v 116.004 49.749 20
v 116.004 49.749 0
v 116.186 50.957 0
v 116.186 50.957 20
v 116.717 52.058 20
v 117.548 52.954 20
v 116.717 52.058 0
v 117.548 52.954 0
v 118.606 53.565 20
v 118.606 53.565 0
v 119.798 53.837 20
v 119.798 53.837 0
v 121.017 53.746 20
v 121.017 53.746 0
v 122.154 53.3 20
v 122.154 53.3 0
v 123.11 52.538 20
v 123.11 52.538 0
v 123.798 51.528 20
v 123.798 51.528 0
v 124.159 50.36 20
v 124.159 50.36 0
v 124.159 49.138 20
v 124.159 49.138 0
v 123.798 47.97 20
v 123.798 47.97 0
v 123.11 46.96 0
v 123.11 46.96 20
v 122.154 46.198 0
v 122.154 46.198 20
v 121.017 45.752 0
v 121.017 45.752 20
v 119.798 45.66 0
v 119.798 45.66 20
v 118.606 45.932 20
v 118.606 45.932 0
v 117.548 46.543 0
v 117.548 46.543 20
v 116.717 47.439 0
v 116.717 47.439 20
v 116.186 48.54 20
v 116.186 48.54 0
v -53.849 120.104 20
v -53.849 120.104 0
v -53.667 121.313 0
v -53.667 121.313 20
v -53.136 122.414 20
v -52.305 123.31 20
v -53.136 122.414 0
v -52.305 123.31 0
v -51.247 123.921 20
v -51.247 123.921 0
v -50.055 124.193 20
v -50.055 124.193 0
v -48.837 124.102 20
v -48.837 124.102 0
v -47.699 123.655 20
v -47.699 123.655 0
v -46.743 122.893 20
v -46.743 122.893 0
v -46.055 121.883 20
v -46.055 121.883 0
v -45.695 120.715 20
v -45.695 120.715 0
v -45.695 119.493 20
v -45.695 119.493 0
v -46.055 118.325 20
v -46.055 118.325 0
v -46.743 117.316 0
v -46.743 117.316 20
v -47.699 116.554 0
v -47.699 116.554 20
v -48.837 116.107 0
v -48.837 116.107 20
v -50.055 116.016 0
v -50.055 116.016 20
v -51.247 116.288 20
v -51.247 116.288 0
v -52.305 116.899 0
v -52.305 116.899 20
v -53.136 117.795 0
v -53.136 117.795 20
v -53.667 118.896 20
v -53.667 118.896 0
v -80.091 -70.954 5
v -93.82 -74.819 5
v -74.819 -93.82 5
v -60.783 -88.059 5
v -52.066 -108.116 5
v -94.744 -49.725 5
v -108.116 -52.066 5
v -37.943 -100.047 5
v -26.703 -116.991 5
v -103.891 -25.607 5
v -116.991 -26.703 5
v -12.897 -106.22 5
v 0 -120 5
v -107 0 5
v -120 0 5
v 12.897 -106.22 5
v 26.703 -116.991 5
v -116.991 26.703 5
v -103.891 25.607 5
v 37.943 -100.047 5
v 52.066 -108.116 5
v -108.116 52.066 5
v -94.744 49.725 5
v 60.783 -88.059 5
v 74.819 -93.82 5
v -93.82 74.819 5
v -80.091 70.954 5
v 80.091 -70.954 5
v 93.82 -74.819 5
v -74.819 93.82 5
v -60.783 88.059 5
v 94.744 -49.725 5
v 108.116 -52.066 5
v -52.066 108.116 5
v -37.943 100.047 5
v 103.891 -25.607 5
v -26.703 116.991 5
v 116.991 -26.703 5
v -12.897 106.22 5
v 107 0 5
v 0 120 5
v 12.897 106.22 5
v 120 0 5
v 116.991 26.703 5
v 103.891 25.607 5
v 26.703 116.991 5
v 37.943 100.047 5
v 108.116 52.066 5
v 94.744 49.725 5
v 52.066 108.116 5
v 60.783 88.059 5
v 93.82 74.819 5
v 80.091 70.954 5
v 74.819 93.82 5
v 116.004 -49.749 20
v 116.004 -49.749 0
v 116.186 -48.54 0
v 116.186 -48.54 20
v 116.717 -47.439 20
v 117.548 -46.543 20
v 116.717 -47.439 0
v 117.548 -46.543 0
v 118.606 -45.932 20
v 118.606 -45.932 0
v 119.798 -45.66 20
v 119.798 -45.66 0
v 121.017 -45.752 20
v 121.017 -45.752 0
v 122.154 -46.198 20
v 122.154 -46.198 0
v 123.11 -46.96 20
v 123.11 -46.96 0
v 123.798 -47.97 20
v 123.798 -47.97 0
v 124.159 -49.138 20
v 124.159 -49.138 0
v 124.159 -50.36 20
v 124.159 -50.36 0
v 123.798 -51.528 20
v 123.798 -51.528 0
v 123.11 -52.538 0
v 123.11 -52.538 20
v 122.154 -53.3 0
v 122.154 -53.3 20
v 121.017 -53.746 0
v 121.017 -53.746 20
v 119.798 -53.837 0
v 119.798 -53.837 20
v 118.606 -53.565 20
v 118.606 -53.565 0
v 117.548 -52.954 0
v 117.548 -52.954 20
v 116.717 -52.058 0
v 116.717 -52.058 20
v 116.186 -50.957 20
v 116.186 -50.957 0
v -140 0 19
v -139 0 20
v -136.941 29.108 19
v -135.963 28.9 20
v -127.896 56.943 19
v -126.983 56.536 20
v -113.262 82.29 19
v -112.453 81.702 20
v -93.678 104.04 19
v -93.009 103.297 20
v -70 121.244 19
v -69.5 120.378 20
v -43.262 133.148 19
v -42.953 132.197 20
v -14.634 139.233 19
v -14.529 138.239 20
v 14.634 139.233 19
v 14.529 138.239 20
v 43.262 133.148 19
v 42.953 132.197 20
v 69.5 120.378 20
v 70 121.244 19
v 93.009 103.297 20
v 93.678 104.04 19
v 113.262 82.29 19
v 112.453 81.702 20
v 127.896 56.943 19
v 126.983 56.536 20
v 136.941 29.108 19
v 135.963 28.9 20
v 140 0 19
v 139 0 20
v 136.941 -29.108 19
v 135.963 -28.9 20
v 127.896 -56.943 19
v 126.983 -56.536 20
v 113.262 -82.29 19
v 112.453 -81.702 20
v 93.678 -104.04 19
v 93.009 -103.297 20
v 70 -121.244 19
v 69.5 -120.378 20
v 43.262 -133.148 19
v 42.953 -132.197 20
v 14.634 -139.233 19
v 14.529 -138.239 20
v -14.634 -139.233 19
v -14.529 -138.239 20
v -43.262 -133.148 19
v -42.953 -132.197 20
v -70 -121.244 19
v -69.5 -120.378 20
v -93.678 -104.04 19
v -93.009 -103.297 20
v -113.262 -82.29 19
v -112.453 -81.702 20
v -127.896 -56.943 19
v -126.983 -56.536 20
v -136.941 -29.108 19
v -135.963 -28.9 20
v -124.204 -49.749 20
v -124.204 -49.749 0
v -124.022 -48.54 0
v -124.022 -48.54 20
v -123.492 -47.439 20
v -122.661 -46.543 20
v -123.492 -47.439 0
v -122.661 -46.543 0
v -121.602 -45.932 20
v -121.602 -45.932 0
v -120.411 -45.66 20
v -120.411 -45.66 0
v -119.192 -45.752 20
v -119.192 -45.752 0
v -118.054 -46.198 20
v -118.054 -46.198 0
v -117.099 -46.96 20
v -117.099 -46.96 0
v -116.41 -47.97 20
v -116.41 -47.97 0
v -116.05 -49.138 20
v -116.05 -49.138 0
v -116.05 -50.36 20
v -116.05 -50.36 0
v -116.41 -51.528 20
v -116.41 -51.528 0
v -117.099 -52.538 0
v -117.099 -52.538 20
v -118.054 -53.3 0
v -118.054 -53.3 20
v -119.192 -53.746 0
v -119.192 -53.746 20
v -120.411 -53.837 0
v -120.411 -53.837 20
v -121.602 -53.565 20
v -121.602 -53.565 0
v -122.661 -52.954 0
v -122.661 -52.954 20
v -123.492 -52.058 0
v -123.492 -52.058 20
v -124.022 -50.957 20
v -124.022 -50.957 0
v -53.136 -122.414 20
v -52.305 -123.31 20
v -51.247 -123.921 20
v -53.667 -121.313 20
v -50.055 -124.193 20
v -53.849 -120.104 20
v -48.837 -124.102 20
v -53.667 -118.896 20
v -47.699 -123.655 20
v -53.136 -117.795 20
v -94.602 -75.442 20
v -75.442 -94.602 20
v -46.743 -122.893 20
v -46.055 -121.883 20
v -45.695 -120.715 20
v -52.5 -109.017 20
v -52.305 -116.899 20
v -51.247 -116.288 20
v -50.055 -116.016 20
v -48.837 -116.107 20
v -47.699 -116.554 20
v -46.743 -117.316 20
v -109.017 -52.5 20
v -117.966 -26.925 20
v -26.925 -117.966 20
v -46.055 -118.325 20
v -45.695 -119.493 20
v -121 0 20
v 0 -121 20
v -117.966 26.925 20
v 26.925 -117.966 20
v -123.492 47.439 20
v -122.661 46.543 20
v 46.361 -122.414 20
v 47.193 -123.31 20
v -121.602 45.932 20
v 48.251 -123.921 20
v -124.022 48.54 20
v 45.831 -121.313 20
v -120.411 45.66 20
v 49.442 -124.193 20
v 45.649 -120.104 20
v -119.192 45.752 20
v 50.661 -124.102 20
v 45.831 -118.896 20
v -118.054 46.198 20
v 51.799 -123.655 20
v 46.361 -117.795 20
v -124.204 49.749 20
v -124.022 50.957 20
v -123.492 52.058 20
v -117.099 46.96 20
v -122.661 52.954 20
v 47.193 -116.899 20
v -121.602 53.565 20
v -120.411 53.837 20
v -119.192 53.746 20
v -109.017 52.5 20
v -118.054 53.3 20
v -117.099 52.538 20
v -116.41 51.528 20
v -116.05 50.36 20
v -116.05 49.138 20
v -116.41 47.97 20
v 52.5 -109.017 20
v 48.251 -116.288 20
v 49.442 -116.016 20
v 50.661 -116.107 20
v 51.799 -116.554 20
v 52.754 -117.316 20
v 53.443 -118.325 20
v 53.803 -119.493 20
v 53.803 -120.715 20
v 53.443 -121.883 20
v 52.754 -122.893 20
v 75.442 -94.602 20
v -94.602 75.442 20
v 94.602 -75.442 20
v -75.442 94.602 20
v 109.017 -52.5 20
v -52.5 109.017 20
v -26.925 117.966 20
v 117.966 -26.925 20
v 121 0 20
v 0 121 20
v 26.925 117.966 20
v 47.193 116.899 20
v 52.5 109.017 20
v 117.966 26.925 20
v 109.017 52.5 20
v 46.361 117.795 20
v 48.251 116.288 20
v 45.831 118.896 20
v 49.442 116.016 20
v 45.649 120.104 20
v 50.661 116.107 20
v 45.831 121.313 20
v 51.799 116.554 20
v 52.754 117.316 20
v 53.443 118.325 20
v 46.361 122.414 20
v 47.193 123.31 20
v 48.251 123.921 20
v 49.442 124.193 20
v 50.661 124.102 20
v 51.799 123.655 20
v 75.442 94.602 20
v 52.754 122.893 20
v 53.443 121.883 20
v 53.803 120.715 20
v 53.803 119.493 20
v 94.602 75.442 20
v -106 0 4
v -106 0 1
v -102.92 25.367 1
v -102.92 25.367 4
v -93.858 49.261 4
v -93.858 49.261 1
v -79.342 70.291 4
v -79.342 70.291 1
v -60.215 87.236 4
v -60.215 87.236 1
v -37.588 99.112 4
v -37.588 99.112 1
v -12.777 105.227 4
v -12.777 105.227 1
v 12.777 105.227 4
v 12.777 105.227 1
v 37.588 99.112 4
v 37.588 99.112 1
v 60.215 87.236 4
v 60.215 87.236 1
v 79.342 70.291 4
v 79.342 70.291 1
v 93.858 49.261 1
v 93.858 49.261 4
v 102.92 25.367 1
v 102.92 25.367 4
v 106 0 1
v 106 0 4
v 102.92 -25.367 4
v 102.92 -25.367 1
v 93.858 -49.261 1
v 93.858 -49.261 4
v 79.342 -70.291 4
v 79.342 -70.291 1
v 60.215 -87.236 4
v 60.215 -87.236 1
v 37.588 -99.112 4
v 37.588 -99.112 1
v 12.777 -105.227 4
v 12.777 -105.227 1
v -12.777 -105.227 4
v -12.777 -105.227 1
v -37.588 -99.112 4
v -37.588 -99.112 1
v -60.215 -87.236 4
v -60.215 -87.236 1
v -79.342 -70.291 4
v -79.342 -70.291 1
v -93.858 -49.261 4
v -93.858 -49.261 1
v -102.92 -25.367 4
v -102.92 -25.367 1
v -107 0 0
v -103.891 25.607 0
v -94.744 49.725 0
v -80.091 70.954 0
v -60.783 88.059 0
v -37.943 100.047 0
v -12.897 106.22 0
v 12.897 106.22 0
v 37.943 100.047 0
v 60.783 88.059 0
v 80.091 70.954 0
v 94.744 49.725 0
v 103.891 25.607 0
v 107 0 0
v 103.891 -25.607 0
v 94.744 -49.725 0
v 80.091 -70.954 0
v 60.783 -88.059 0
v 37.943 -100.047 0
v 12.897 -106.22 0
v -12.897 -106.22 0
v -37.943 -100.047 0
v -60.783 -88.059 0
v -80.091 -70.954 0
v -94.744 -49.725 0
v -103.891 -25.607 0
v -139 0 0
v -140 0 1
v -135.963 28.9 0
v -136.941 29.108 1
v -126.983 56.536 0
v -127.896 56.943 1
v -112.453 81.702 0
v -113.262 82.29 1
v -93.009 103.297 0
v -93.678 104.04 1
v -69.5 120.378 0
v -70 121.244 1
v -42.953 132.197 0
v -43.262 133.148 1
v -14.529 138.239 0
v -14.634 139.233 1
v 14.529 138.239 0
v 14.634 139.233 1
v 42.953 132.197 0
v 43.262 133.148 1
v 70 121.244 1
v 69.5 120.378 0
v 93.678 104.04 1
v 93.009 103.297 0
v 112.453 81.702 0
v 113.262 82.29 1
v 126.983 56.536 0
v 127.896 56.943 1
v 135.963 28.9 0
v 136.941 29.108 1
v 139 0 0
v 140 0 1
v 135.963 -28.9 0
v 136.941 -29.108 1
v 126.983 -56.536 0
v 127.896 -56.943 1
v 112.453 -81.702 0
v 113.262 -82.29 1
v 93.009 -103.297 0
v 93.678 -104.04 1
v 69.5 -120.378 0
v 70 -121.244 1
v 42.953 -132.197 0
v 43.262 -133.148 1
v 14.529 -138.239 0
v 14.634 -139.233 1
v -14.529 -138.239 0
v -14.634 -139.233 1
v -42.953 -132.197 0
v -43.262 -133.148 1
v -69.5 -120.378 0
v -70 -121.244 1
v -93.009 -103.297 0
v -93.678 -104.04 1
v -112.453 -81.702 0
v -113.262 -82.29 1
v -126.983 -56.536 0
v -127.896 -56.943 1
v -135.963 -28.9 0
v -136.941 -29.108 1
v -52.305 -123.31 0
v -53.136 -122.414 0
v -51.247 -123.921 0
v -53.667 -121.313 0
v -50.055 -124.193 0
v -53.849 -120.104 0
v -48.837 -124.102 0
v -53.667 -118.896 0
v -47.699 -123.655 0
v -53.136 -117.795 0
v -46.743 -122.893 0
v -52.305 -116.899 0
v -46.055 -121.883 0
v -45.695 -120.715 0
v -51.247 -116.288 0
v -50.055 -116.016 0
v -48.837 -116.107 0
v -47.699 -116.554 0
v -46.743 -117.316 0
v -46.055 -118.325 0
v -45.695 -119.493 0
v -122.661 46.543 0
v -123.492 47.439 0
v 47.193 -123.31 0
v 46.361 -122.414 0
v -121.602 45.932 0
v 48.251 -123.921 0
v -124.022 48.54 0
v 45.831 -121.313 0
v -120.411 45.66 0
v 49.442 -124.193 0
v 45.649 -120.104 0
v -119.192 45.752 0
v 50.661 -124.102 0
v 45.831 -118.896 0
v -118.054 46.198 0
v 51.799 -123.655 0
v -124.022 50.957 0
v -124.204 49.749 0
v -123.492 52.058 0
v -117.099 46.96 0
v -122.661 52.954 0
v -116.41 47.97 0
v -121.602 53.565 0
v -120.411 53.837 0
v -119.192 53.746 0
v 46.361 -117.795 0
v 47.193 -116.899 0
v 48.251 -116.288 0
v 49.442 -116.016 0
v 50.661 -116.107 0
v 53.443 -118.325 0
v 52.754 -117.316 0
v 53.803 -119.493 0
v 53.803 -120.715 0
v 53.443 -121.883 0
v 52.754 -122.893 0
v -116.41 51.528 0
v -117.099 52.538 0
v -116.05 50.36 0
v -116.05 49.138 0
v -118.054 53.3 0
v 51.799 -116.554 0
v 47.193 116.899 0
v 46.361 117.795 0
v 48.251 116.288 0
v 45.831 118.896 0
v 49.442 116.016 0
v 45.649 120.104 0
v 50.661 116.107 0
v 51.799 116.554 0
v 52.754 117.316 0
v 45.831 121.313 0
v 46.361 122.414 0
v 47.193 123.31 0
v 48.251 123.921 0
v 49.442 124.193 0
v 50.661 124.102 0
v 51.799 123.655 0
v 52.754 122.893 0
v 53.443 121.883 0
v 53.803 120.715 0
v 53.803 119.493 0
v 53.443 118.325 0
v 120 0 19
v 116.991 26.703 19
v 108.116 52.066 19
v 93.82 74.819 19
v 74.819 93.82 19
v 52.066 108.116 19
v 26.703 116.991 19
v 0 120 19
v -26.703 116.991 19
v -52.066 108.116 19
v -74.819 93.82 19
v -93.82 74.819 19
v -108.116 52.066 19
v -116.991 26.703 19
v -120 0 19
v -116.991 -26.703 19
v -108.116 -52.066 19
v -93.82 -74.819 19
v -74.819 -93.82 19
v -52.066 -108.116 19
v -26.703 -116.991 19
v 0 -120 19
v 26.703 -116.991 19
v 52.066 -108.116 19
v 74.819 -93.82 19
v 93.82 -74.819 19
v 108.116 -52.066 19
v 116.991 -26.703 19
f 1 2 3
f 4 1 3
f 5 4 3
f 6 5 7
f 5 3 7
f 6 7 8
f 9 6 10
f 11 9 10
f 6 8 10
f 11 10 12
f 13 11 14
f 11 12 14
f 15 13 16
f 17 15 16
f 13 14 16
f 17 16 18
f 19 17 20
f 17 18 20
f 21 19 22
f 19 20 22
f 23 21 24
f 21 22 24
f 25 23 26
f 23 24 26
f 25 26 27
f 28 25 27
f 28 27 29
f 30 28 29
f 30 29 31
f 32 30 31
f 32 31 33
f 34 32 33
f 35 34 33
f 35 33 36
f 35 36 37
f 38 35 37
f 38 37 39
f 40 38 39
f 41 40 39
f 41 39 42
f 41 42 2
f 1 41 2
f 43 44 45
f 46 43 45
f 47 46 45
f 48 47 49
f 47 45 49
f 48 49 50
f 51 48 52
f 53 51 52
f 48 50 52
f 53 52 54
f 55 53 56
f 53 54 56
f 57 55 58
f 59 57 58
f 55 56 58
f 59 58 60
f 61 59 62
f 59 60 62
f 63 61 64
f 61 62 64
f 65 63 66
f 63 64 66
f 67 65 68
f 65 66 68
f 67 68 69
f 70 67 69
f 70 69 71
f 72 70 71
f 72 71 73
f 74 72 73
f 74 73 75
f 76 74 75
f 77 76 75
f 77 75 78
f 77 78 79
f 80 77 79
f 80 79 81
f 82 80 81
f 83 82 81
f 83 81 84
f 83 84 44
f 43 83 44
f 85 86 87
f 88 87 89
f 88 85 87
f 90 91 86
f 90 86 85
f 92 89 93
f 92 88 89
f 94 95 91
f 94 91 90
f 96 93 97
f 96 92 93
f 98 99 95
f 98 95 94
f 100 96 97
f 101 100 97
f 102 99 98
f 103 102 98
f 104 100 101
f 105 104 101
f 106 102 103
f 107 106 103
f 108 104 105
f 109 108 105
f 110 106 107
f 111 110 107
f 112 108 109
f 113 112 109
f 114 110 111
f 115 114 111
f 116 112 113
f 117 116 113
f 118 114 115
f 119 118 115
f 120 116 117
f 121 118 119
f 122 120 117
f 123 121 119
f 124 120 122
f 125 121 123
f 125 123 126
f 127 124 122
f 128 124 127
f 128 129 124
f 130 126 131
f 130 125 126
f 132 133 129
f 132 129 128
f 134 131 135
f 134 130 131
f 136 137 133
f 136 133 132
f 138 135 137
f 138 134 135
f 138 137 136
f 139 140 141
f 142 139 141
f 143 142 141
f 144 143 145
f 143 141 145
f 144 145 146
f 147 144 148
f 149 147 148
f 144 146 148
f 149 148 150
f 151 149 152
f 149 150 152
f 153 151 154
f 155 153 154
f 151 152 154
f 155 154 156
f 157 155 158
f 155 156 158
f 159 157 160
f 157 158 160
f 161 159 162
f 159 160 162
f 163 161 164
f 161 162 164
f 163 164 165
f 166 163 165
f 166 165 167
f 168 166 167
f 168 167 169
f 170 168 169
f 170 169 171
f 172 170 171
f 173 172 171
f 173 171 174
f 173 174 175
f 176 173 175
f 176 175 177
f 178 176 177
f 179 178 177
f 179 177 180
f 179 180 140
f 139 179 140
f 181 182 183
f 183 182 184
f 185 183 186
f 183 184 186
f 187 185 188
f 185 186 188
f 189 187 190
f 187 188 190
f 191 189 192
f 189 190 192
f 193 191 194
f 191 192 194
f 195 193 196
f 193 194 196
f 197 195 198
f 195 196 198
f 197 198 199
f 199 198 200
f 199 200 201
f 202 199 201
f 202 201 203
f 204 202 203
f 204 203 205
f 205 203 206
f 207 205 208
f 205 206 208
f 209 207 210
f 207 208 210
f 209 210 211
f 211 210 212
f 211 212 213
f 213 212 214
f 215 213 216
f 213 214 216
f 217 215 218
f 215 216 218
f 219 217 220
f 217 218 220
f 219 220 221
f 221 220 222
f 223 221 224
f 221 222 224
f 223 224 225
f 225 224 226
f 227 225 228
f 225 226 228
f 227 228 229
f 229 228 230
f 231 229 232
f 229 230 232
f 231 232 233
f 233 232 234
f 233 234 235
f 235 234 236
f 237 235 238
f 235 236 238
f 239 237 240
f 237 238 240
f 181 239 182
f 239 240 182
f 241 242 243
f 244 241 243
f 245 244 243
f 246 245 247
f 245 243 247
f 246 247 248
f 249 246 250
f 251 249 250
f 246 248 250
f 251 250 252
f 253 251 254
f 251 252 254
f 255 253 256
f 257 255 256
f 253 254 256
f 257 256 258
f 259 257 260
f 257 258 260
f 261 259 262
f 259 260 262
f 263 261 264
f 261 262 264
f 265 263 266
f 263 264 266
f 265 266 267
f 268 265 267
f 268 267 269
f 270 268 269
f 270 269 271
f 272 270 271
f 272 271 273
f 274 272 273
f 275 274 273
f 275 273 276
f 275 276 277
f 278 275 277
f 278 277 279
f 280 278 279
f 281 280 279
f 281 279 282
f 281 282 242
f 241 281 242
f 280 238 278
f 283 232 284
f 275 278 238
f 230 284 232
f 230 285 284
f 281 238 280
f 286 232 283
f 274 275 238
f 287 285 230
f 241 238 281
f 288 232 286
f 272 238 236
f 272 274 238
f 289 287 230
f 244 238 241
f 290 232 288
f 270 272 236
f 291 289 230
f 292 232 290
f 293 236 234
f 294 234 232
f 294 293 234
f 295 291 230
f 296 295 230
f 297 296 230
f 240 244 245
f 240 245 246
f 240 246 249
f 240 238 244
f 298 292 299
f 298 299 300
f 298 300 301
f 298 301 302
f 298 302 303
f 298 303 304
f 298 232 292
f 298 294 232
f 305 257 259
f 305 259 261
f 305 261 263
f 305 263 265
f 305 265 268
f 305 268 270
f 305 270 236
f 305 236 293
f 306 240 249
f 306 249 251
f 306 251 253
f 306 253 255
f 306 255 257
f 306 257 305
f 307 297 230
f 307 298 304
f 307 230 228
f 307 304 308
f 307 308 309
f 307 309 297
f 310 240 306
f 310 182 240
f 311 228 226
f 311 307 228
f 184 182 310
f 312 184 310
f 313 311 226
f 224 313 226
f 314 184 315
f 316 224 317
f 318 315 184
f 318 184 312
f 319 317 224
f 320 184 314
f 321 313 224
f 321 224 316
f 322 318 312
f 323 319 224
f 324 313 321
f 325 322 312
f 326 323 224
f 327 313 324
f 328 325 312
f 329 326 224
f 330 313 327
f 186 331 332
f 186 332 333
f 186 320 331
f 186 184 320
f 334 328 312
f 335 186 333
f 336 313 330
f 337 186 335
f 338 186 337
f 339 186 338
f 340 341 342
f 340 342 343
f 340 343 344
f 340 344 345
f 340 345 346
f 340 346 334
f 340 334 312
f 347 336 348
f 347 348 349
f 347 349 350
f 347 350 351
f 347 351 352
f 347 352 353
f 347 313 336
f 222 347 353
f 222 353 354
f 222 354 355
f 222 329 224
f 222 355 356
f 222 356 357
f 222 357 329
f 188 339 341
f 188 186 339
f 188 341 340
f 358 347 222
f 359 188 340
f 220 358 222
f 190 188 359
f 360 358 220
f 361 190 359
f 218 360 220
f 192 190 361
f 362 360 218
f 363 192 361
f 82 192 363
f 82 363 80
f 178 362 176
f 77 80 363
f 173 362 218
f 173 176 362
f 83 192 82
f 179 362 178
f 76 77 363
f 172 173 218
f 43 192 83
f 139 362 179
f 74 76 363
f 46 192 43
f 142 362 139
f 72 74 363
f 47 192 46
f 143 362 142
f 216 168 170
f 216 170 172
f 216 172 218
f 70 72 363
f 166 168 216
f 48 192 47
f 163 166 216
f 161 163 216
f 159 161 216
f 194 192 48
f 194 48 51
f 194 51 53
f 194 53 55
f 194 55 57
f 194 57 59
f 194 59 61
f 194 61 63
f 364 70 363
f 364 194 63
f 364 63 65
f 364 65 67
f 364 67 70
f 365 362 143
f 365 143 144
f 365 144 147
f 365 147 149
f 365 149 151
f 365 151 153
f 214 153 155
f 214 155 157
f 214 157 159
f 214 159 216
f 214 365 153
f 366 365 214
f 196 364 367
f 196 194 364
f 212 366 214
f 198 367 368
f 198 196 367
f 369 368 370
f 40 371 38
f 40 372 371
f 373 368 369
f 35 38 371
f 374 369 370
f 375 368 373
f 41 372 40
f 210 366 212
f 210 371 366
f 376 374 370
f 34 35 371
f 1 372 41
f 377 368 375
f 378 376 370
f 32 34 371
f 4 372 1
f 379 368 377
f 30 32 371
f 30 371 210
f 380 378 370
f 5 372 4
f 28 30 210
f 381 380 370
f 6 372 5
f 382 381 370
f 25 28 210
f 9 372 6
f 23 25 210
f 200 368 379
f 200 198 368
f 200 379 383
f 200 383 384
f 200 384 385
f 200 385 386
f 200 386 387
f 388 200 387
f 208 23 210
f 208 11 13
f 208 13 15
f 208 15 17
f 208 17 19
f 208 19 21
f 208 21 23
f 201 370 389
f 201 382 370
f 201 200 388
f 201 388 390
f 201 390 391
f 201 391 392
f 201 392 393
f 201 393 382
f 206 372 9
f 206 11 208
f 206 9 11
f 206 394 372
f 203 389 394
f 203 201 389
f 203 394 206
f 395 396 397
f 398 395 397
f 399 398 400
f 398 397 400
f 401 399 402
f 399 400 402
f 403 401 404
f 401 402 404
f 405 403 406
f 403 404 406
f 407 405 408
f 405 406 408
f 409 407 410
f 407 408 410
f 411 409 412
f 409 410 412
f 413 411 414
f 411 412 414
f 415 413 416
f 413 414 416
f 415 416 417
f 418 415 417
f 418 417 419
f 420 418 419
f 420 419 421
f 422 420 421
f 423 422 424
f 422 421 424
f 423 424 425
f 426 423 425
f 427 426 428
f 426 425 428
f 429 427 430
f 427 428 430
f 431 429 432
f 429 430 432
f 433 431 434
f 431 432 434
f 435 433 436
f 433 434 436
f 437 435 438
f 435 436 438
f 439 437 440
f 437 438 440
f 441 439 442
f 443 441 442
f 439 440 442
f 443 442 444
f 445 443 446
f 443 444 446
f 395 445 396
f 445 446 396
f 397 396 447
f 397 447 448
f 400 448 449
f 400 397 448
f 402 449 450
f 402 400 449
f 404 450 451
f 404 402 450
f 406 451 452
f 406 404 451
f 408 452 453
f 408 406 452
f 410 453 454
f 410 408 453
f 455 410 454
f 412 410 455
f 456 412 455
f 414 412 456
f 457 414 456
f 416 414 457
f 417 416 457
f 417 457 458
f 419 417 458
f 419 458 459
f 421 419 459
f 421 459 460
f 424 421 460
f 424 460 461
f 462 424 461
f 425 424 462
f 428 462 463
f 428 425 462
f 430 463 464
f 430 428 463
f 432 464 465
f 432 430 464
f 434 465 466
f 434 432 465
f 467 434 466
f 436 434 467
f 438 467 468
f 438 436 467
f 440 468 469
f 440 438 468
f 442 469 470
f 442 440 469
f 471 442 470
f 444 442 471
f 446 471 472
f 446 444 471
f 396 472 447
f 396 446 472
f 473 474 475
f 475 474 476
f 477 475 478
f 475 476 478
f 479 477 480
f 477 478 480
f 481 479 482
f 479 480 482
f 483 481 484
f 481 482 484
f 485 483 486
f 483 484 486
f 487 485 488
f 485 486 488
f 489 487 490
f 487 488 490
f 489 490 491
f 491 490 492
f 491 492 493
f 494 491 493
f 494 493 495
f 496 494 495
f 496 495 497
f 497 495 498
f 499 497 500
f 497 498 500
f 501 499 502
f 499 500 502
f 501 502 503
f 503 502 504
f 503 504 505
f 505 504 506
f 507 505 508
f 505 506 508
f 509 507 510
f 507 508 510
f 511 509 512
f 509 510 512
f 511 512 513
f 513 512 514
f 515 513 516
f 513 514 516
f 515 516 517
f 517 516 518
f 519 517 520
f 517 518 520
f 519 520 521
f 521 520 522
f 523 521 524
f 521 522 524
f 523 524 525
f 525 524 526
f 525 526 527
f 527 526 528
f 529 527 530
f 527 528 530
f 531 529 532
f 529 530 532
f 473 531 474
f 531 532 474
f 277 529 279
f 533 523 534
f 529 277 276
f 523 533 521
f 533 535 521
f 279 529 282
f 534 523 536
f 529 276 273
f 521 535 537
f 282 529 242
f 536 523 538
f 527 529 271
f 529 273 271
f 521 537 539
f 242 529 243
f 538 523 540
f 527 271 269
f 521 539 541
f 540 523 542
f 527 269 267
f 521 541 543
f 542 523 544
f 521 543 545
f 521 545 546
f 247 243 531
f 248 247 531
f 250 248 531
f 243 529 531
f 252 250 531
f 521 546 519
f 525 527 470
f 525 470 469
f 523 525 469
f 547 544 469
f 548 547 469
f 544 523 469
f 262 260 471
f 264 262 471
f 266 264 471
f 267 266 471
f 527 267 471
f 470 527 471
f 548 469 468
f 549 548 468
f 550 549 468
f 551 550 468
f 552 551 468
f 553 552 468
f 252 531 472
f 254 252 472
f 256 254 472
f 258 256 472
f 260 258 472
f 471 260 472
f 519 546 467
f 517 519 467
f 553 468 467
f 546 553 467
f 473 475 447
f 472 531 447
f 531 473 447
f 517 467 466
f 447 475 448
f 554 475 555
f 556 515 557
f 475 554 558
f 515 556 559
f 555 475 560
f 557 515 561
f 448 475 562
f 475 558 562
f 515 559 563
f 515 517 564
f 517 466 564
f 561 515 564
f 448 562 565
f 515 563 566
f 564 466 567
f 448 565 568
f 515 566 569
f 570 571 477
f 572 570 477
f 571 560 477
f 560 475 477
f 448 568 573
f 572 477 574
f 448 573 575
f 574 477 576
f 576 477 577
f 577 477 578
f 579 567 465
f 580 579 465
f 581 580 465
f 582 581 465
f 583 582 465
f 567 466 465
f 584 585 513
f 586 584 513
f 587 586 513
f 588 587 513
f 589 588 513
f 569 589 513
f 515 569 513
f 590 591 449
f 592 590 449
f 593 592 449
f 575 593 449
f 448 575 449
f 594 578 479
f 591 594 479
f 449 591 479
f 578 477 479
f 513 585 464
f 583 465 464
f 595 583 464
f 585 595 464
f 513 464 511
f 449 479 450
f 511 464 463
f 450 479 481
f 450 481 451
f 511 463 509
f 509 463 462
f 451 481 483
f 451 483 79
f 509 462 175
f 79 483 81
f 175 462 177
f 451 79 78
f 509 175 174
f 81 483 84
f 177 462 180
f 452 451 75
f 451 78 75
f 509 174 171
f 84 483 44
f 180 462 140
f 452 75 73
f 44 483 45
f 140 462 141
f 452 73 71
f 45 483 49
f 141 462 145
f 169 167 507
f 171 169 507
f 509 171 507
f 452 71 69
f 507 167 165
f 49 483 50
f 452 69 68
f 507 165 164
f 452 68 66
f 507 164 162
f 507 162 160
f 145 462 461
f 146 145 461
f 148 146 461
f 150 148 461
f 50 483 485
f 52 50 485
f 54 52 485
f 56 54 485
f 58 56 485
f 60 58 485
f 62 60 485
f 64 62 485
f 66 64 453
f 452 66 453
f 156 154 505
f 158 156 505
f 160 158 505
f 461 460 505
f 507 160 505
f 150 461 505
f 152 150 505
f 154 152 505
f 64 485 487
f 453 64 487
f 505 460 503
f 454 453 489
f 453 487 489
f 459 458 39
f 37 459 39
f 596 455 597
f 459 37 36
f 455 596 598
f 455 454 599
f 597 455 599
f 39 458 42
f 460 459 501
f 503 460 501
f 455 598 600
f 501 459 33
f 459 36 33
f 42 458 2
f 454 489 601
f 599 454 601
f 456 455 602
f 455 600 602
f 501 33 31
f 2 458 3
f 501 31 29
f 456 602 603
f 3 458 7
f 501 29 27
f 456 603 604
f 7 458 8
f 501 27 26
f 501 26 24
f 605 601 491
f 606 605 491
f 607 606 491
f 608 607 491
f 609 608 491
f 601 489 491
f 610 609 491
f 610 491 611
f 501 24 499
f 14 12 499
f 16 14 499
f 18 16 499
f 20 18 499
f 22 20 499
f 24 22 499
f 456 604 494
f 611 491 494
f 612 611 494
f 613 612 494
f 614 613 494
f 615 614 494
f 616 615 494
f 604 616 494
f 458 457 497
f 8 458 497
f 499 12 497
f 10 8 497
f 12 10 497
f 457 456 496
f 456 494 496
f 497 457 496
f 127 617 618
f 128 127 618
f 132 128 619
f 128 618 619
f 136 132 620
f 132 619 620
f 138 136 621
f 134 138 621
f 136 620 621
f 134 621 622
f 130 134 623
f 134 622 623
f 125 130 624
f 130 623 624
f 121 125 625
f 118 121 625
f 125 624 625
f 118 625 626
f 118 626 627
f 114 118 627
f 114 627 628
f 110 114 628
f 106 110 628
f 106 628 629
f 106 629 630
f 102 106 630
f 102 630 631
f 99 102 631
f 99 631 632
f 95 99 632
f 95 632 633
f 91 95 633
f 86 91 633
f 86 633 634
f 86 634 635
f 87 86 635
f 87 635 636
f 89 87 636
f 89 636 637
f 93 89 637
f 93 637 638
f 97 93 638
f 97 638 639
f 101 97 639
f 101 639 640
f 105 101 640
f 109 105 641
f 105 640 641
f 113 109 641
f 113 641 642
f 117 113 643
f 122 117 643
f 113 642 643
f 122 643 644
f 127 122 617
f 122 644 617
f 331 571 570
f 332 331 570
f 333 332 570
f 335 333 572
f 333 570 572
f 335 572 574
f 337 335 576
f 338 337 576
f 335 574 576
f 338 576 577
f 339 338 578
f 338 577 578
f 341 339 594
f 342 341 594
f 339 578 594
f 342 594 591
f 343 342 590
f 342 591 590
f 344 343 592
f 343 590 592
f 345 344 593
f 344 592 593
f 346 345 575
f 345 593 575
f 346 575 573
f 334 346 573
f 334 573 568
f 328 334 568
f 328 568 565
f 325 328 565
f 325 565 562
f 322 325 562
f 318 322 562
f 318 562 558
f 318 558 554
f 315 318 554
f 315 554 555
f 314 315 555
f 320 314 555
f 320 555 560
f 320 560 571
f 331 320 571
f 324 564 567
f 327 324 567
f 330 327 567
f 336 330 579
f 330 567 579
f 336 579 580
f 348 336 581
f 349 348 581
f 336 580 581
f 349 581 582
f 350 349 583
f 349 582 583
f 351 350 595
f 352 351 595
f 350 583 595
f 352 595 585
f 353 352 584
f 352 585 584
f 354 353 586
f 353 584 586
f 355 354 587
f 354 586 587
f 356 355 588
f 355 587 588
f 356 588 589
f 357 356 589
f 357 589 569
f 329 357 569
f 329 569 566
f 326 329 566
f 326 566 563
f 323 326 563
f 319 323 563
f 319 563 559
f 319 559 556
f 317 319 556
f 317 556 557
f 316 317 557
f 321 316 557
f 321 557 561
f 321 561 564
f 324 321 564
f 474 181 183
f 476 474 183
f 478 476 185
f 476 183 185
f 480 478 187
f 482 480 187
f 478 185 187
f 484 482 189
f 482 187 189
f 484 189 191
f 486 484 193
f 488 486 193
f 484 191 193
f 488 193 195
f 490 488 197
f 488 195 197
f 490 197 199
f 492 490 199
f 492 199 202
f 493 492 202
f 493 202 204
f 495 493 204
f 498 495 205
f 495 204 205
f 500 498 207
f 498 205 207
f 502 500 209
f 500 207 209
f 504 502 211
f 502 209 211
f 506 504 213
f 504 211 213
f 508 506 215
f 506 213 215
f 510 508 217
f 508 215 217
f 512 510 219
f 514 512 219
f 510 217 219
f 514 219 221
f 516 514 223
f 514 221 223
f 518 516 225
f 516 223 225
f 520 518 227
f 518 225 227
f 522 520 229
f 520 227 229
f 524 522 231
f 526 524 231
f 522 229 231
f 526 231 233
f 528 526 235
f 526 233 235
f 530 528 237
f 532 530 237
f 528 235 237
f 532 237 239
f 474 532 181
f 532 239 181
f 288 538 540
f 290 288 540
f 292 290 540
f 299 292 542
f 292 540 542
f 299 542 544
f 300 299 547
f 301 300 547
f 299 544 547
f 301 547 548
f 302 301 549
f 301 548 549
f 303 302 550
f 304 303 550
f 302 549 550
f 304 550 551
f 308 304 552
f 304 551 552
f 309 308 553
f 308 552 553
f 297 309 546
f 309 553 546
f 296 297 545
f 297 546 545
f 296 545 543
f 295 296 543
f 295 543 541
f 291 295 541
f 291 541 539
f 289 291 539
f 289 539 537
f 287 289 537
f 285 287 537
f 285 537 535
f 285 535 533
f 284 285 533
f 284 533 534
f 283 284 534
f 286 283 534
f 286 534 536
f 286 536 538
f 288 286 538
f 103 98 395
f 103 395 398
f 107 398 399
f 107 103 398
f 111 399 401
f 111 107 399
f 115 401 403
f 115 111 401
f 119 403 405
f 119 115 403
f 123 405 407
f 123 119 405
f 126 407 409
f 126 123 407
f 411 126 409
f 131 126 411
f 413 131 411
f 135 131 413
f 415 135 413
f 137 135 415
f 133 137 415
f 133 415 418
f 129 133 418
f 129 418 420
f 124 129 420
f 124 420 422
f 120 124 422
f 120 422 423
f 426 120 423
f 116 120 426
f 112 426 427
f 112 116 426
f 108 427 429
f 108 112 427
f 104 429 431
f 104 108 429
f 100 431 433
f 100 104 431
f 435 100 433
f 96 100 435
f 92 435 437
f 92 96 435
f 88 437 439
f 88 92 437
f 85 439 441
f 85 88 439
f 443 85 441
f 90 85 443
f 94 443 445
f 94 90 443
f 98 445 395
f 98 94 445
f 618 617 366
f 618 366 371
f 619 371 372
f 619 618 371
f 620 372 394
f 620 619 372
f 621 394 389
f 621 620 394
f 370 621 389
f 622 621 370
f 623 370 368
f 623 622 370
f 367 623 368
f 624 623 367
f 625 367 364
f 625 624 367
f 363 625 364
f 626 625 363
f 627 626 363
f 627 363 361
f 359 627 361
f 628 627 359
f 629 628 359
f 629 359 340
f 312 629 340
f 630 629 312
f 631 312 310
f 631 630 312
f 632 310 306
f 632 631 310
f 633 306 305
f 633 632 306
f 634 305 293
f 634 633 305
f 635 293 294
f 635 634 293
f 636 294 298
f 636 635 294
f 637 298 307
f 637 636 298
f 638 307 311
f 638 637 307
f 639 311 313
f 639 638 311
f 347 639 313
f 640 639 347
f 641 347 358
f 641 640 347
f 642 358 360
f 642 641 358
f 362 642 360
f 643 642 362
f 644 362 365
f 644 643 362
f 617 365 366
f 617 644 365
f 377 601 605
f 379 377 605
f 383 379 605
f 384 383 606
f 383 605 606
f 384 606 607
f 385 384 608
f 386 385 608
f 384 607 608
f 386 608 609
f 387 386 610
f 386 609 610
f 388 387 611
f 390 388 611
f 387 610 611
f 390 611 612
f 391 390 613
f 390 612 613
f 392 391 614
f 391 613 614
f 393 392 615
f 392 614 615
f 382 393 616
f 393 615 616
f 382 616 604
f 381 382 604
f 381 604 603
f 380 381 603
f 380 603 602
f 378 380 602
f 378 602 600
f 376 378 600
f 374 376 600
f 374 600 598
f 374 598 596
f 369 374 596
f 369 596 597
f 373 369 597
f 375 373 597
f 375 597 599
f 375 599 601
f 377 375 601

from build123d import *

# Parameters (mm, degrees)
SKETCH1_W                  = 140
SKETCH1_H                  = 20
F_8_2_8_2_DIAMETER_HOLE1_D = 8.2
HOLE1_D                    = 212
HOLE1_CBORE_D              = 240
HOLE1_CBORE_DEPTH          = 15
CHAMFER1_SIZE              = 1


with BuildPart() as part:
    # Sketch1 → Revolve1 (revolve)
    with BuildSketch(Plane.XZ, mode=Mode.PRIVATE) as revolve1_sk:
        with Locations((70, 10)):
            Rectangle(SKETCH1_W, SKETCH1_H)
    revolve(revolve1_sk.sketch.rotate(Axis((0, 0, 20), (0, 0, -1)), 180), axis=Axis((0, 0, 20), (0, 0, -1)))

    # Ø8.2 (8.2) Diameter Hole1 (through all)
    with Locations(Plane.XY.offset(20)):
        with Locations((49.748846207, 120.104339226), (120.104339226, 49.748846207), (120.104339226, -49.748846207), (49.748846207, -120.104339226), (-49.748846207, -120.104339226), (-120.104339226, -49.748846207), (-120.104339226, 49.748846207), (-49.748846207, 120.104339226)):
            Hole(F_8_2_8_2_DIAMETER_HOLE1_D / 2)

    # Hole1 (through all)
    with Locations(Plane.XY.offset(20)):
        with Locations((0, 0)):
            CounterBoreHole(HOLE1_D / 2, HOLE1_CBORE_D / 2, HOLE1_CBORE_DEPTH)

    # Chamfer1
    chamfer1_edges = [part.edges().sort_by_distance(p)[0] for p in [
        (140, 0, 0),
        (140, 0, 20),
        (-120, 0, 20),
        (106, 0, 0),
        (106, 0, 5),
    ]]
    chamfer(chamfer1_edges, length=CHAMFER1_SIZE)


solid = part.part
